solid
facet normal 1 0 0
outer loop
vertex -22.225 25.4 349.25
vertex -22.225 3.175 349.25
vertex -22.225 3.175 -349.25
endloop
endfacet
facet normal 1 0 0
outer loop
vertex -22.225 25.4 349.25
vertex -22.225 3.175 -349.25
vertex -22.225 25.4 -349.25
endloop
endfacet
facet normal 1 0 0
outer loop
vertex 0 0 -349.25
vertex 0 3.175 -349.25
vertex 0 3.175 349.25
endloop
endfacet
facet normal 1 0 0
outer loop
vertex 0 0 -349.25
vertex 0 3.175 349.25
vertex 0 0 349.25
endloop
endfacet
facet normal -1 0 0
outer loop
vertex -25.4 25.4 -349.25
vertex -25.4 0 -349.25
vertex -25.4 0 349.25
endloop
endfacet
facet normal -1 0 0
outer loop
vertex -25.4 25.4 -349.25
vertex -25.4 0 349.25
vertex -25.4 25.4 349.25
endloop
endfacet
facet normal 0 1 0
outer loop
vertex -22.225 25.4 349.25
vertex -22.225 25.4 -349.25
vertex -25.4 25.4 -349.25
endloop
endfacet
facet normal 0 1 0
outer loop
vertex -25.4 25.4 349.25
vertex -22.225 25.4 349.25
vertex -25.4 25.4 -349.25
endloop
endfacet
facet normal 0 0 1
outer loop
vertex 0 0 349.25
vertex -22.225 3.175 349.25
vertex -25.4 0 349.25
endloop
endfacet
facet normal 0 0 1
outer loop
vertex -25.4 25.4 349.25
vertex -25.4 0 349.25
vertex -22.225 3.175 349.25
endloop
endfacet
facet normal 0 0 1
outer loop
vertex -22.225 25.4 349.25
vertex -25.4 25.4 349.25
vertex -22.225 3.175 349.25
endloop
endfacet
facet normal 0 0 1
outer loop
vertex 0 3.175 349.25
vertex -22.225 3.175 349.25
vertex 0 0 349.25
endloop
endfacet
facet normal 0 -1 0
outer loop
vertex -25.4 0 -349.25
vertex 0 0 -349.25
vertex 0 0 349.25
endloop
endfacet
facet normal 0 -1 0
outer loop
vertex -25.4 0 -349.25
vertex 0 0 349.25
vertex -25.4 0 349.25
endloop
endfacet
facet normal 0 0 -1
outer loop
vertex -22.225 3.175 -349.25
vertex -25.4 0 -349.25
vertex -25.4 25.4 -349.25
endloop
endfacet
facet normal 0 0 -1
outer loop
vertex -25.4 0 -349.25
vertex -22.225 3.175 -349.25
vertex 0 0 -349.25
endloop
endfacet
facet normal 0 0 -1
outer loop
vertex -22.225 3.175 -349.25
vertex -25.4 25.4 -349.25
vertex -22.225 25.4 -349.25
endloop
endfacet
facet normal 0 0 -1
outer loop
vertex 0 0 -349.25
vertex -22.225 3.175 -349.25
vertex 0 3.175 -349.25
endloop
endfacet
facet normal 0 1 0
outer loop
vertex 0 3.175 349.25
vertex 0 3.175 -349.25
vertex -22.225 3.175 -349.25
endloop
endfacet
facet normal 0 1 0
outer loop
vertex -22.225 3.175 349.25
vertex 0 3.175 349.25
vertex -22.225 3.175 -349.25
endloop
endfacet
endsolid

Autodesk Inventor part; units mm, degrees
ref_plane "YZ Plane" through (0, 0, 0) normal (1, 0, 0) x (0, 1, 0)
ref_plane "XZ Plane" through (0, 0, 0) normal (0, 1, 0) x (-1, 0, 0)
ref_plane "XY Plane" through (0, 0, 0) normal (0, 0, 1) x (1, 0, 0)
sketch "Sketch1" plane through (0, 0, 0) normal (0, 0, 1) x (1, 0, 0)
  line L0 (0, 0) -> (-25.4, 0)
  line L1 (-25.4, 0) -> (-25.4, 25.4)
  line L2 (0, 3.175) -> (-22.225, 3.175)
  line L3 (-22.225, 3.175) -> (-22.225, 25.4)
  line L4 (-22.225, 25.4) -> (-25.4, 25.4)
  line L5 (0, 3.175) -> (0, 0)
  dimension "d0" = 25.4
  dimension "d1" = 25.4
  dimension "d2" = 3.175
extrude "Extrusion1" add sketch "Sketch1" along normal mid plane 698.5
properties part number "27.5 Top L"
